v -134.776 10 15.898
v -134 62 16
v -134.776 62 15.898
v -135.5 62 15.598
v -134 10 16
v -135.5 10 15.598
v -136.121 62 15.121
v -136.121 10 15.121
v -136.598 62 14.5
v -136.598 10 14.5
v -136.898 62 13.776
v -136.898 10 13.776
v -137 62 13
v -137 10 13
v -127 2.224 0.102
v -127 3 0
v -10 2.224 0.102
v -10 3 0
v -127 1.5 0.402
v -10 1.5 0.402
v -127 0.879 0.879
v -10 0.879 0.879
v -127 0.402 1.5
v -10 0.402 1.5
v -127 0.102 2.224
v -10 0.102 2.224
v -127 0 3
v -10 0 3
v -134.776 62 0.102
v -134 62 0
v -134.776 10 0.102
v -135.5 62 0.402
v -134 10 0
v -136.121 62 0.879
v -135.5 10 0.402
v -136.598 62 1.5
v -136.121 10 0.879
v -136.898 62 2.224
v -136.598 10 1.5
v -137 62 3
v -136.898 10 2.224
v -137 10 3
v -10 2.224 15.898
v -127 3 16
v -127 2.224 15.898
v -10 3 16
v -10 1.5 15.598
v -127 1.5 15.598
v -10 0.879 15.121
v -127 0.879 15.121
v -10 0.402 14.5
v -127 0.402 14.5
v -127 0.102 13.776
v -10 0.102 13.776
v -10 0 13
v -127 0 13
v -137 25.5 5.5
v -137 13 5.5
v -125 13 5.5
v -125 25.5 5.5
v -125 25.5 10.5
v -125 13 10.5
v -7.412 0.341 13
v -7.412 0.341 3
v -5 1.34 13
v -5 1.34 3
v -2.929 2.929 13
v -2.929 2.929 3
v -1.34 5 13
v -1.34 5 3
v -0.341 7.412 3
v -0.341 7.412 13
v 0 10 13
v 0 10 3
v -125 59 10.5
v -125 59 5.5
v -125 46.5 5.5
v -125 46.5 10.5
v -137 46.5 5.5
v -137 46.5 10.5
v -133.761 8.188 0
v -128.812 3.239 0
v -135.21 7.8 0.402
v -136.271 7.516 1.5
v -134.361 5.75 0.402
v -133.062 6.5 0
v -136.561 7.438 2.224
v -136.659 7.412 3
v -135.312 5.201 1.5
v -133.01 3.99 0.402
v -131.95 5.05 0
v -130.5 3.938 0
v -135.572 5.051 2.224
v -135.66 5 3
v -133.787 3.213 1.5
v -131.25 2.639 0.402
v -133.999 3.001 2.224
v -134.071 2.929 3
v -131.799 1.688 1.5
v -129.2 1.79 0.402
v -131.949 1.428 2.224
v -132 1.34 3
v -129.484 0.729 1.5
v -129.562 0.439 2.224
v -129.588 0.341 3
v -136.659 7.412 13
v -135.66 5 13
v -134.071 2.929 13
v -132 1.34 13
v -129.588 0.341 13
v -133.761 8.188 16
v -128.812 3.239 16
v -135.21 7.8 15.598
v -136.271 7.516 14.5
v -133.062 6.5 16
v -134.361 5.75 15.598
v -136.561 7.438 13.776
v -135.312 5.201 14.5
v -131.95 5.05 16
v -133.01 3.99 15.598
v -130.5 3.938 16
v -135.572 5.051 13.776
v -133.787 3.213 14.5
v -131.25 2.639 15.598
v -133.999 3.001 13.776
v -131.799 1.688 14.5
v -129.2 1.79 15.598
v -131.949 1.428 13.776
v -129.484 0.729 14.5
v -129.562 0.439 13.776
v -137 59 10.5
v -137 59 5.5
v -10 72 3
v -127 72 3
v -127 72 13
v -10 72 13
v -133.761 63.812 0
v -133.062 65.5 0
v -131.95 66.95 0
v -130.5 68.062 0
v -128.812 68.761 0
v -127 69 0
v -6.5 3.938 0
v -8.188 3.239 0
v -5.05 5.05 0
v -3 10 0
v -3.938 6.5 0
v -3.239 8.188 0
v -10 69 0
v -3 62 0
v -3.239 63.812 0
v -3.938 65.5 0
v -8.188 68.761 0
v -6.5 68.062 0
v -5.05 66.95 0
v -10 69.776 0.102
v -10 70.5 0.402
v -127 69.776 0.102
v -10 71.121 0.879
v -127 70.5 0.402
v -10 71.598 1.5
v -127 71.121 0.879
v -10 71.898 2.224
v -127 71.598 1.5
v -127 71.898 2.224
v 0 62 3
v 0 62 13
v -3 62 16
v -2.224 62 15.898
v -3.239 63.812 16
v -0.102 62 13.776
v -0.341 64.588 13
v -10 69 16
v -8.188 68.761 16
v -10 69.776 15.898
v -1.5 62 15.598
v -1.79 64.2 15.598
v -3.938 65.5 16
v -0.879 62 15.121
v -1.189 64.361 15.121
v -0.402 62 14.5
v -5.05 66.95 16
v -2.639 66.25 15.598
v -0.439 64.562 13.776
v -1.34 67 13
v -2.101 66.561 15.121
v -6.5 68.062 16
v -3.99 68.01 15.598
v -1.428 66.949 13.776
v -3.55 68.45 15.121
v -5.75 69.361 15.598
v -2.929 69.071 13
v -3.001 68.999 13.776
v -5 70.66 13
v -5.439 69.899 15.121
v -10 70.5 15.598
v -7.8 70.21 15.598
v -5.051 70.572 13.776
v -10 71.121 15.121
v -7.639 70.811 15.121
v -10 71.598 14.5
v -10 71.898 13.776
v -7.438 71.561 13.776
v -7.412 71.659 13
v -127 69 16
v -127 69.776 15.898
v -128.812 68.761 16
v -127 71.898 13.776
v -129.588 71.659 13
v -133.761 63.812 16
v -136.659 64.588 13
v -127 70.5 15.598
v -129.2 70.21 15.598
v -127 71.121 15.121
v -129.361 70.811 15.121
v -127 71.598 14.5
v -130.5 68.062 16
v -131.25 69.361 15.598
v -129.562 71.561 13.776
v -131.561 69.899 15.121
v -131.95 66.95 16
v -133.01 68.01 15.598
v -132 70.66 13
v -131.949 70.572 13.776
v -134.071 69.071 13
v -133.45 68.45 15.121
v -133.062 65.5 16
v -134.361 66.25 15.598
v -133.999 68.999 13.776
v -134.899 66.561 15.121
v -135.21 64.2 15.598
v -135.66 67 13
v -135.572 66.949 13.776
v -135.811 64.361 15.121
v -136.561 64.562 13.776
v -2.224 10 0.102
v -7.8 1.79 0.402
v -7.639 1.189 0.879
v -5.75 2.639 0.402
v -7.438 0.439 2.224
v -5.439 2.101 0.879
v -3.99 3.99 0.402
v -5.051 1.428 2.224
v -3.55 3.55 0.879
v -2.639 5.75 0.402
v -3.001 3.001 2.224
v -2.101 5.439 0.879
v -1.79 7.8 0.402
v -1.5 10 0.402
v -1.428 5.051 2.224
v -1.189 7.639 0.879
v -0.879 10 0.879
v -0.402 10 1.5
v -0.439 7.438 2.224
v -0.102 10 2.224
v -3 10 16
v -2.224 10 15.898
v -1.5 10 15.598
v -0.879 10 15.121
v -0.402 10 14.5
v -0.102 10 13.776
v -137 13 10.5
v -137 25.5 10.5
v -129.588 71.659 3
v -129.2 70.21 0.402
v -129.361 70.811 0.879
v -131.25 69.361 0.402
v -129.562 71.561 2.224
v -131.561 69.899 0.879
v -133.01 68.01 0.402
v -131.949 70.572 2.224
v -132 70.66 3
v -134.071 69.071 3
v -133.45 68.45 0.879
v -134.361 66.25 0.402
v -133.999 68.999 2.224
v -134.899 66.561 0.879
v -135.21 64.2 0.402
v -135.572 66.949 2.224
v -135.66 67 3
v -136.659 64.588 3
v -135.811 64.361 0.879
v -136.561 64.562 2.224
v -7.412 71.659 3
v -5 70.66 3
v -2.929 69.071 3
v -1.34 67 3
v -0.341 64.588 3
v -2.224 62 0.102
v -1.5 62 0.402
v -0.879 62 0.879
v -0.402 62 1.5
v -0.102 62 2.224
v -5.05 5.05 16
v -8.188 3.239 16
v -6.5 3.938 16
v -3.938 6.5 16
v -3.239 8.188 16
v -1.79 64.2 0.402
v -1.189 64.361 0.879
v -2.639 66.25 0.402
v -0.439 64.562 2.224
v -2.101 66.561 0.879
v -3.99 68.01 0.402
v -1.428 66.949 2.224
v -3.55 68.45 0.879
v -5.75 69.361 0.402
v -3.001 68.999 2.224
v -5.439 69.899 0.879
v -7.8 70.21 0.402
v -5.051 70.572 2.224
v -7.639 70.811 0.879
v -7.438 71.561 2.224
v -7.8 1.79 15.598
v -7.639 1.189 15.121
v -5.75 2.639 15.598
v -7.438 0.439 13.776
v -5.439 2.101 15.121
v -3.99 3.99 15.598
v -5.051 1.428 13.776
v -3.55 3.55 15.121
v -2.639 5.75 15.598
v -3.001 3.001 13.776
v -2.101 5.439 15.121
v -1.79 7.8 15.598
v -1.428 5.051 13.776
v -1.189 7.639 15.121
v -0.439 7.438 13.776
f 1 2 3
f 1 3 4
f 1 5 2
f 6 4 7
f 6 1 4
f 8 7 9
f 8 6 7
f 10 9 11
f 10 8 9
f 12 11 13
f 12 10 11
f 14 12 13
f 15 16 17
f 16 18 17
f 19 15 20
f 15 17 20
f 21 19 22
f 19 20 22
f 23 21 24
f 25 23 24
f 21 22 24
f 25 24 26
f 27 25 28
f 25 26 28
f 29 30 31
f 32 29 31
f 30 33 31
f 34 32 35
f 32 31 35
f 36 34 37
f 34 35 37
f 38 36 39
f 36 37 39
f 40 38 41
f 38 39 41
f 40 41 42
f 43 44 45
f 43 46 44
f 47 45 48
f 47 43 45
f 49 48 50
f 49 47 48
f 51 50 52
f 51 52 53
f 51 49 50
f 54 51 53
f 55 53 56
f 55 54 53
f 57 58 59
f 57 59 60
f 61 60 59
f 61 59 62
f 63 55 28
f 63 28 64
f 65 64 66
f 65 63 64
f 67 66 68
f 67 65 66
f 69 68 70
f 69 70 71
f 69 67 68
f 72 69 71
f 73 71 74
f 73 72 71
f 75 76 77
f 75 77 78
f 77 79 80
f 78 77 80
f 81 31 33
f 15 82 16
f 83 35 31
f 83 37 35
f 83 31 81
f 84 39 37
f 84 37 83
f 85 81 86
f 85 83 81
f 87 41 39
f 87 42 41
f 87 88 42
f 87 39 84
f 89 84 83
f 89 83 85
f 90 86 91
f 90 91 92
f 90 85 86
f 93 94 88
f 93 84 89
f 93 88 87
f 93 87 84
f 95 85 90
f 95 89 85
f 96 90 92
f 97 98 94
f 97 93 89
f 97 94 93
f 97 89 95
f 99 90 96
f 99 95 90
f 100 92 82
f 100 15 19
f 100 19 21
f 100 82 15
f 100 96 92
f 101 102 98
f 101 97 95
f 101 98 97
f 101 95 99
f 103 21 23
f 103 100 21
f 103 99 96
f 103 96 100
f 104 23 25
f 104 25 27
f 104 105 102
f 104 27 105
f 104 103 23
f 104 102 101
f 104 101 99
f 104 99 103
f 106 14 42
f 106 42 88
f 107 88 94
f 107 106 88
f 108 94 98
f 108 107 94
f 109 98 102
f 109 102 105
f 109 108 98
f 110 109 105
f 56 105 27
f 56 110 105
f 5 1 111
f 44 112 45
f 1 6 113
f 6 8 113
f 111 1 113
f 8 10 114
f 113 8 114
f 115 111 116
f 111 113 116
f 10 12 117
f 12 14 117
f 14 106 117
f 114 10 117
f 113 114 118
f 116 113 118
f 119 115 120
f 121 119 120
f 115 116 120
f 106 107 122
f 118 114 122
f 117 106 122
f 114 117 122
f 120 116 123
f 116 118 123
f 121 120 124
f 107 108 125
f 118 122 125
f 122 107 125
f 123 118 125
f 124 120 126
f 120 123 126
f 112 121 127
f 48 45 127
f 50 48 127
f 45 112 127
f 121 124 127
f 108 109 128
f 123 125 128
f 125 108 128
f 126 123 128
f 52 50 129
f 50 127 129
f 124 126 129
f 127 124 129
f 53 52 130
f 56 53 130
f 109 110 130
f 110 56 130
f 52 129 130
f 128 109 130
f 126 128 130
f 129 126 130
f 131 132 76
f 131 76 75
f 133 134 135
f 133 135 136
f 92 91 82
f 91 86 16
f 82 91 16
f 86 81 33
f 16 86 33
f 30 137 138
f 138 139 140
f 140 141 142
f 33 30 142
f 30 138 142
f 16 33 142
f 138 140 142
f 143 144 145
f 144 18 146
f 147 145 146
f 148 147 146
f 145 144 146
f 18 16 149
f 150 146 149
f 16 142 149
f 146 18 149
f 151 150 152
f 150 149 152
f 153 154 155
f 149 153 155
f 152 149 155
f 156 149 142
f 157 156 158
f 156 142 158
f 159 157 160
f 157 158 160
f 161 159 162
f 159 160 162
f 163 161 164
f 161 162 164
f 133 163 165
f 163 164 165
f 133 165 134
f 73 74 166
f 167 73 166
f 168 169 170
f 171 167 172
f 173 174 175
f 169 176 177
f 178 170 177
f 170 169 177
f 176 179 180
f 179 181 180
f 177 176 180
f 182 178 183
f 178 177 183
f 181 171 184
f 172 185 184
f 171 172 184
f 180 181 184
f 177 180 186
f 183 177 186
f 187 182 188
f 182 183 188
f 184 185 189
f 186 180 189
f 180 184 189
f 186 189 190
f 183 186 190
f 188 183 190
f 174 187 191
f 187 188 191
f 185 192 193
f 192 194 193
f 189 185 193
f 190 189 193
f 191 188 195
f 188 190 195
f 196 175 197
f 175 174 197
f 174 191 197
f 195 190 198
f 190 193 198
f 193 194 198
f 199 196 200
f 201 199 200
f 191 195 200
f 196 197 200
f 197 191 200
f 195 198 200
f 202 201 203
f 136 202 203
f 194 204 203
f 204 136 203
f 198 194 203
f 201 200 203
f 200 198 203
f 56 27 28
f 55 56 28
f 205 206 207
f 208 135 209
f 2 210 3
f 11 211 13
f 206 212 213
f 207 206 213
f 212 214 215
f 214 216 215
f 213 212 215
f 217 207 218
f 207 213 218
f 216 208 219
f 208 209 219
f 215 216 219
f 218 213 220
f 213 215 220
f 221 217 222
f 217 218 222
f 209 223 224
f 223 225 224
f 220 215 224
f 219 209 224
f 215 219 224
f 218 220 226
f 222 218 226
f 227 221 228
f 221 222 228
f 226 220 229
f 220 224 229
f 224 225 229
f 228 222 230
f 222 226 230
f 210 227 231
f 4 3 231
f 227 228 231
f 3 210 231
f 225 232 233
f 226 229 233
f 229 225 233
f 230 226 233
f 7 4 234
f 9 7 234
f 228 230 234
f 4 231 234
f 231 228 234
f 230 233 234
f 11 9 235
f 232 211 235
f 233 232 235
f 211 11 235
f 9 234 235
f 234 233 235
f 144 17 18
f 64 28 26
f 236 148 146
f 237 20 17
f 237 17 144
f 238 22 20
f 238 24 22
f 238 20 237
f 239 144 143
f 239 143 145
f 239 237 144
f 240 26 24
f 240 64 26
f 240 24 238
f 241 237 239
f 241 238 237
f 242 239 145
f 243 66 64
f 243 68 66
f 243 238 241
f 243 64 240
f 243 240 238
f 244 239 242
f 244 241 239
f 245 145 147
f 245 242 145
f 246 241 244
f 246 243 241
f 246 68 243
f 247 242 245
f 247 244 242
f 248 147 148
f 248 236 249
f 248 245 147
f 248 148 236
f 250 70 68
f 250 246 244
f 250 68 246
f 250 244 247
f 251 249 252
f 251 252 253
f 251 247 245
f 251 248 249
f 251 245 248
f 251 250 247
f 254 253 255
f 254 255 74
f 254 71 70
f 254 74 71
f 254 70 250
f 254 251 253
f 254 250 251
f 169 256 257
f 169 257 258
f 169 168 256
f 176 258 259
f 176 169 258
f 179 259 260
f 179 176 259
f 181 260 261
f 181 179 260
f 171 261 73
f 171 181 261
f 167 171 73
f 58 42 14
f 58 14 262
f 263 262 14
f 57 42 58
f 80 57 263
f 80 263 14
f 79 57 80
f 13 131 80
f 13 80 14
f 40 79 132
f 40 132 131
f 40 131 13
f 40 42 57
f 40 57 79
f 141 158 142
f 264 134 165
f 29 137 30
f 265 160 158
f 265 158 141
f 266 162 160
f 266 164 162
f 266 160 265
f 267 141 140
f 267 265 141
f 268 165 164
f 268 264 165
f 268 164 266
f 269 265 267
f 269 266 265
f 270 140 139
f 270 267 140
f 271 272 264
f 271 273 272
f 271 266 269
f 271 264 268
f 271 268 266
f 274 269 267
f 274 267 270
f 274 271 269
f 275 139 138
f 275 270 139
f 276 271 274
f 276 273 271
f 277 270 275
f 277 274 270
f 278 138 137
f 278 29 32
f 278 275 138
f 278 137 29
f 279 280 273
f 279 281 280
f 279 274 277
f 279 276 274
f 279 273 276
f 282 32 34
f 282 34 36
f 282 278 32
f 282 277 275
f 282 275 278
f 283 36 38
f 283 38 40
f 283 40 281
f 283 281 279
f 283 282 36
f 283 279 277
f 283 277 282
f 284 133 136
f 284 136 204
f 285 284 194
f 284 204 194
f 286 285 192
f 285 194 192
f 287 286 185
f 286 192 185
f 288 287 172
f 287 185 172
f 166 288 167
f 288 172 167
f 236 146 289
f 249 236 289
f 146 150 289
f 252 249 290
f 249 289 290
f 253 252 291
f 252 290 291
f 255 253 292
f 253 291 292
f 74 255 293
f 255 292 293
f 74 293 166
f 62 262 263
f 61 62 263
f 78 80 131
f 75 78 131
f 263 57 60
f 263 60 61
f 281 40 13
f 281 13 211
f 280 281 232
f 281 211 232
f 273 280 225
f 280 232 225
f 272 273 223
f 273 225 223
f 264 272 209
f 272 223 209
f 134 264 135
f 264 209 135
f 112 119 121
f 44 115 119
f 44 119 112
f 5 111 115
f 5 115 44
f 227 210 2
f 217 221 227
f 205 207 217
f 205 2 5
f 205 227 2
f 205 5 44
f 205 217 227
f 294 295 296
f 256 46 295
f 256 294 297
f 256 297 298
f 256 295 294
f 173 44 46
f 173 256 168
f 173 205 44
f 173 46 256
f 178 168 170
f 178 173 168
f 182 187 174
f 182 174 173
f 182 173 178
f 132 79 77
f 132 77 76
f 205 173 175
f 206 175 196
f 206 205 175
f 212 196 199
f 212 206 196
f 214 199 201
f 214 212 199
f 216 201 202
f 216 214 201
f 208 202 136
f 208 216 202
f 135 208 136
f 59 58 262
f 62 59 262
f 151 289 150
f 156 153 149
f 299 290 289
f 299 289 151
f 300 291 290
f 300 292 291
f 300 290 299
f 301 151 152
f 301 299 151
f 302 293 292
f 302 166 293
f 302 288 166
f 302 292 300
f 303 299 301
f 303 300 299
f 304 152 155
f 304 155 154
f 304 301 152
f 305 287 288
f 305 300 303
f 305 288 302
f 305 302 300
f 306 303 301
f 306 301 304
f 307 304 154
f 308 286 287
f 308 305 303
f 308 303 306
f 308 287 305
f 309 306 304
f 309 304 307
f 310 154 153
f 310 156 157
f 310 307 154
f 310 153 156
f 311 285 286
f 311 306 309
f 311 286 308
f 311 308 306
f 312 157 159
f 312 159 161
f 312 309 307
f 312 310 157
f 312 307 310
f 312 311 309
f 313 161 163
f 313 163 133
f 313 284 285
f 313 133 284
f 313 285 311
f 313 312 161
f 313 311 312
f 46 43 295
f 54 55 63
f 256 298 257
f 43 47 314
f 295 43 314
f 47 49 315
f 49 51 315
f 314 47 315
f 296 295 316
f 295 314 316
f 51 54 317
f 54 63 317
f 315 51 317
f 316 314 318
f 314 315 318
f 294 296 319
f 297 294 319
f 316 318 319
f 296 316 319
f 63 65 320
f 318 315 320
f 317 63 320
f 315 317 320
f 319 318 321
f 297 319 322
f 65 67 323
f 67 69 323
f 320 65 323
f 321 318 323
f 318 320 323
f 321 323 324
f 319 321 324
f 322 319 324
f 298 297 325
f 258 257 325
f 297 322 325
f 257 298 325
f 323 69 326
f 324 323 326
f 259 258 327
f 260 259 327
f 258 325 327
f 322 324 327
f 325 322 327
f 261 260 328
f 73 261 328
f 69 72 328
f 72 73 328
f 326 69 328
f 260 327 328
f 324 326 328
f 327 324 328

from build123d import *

# Parameters (mm, degrees)
SKETCH1_W           = 137
SKETCH1_H           = 72
BOSS_EXTRUDE1_DEPTH = 16
SKETCH2_W           = 5
SKETCH2_H           = 12.5
CUT_EXTRUDE1_DEPTH  = 12
FILLET1_R           = 10
FILLET2_R           = 3
FILLET3_R           = 3


with BuildPart() as part:
    # Sketch1 → Boss-Extrude1 (new body)
    with BuildSketch(Plane.XY):
        with Locations((-68.5, 36)):
            Rectangle(SKETCH1_W, SKETCH1_H)
    extrude(amount=BOSS_EXTRUDE1_DEPTH)

    # Sketch2 → Cut-Extrude1 (cut)
    with BuildSketch(Plane.ZY.offset(137)):
        with Locations((8, 52.75)):
            Rectangle(SKETCH2_W, SKETCH2_H)
        with Locations((8, 19.25)):
            Rectangle(SKETCH2_W, SKETCH2_H)
    extrude(amount=-CUT_EXTRUDE1_DEPTH, mode=Mode.SUBTRACT)

    # Fillet1
    fillet1_edges = [part.edges().sort_by_distance(p)[0] for p in [
        (0, 0, 8),
        (-137, 0, 8),
        (-137, 72, 8),
        (0, 72, 8),
    ]]
    fillet(fillet1_edges, radius=FILLET1_R)

    # Fillet2
    fillet2_edges = [part.edges().sort_by_distance(p)[0] for p in [
        (-68.5, 0, 0),
        (0, 36, 0),
        (-137, 36, 0),
        (-68.5, 72, 0),
        (-134.071067812, 69.071067812, 0),
        (-2.928932188, 69.071067812, 0),
        (-2.928932188, 2.928932188, 0),
        (-134.071067812, 2.928932188, 0),
    ]]
    fillet(fillet2_edges, radius=FILLET2_R)

    # Fillet3
    fillet3_edges = [part.edges().sort_by_distance(p)[0] for p in [
        (-68.5, 0, 16),
        (-137, 36, 16),
        (0, 36, 16),
        (-68.5, 72, 16),
        (-134.071067812, 69.071067812, 16),
        (-2.928932188, 69.071067812, 16),
        (-2.928932188, 2.928932188, 16),
        (-134.071067812, 2.928932188, 16),
    ]]
    fillet(fillet3_edges, radius=FILLET3_R)


solid = part.part
